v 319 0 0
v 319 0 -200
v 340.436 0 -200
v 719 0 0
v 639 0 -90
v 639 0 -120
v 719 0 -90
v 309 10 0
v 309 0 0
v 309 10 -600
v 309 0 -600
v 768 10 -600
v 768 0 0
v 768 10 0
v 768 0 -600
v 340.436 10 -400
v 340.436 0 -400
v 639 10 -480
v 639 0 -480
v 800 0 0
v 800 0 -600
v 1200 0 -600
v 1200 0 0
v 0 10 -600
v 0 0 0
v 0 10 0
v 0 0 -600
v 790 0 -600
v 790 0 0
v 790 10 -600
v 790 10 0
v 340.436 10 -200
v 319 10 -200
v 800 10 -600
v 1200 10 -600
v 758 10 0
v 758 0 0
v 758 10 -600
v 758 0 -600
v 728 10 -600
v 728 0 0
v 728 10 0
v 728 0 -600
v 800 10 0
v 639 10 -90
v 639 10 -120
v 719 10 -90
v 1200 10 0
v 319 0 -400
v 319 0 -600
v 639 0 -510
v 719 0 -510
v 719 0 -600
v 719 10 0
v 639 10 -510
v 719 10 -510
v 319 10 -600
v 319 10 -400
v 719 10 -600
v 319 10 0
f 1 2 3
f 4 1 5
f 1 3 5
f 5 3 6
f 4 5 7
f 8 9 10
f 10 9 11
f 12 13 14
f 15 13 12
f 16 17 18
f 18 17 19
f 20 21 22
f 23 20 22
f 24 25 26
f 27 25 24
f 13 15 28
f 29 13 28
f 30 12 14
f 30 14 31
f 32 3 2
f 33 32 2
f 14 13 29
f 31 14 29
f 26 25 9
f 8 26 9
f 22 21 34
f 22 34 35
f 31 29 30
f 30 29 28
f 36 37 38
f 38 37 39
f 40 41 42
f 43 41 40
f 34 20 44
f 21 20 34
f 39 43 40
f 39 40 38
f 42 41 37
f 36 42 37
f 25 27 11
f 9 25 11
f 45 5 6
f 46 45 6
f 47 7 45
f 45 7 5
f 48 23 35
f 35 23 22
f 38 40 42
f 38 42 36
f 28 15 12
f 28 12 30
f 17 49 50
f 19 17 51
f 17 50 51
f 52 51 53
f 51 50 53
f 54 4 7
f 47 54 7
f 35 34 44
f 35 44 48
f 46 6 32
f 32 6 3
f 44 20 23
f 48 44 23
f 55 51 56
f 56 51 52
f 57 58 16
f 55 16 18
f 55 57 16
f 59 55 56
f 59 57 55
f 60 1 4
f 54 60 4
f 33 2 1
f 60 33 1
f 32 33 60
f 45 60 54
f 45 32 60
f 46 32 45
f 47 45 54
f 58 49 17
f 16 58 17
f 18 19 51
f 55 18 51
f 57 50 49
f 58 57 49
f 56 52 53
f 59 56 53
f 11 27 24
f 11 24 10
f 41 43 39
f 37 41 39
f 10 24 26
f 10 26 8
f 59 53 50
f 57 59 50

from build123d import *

# Parameters (mm, degrees)
SKETCH1_W             = 309
SKETCH1_H             = 600
BOSS_EXTRUDE1_DEPTH   = 10
BOSS_EXTRUDE1_2_DEPTH = 10
SKETCH1_W_2           = 400
BOSS_EXTRUDE1_3_DEPTH = 10
BOSS_EXTRUDE1_4_DEPTH = 10
SKETCH1_W_3           = 22
BOSS_EXTRUDE1_5_DEPTH = 10
SKETCH1_W_4           = 30
BOSS_EXTRUDE1_6_DEPTH = 10


with BuildPart() as part:
    # Sketch1 → Boss-Extrude1 (new body)
    with BuildSketch(Plane(origin=(0, 0, 0), x_dir=(1, 0, 0), z_dir=(0, 1, 0))):
        with Locations((154.5, 300)):
            Rectangle(SKETCH1_W, SKETCH1_H)
    extrude(amount=BOSS_EXTRUDE1_DEPTH)


with BuildPart() as body_2:
    # Sketch1 → Boss-Extrude1 2 (new body)
    with BuildSketch(Plane(origin=(0, 0, 0), x_dir=(1, 0, 0), z_dir=(0, 1, 0))):
        Polygon((719, 510), (719, 600), (319, 600), (319, 400), (340.435935394, 400), (639, 480), (639, 510), align=None)
    extrude(amount=BOSS_EXTRUDE1_2_DEPTH)


with BuildPart() as body_3:
    # Sketch1 → Boss-Extrude1 3 (new body)
    with BuildSketch(Plane(origin=(0, 0, 0), x_dir=(1, 0, 0), z_dir=(0, 1, 0))):
        with Locations((1000, 300)):
            Rectangle(SKETCH1_W_2, SKETCH1_H)
    extrude(amount=BOSS_EXTRUDE1_3_DEPTH)


with BuildPart() as body_4:
    # Sketch1 → Boss-Extrude1 4 (new body)
    with BuildSketch(Plane(origin=(0, 0, 0), x_dir=(1, 0, 0), z_dir=(0, 1, 0))):
        Polygon((719, 0), (719, 90), (639, 90), (639, 120), (340.435935394, 200), (319, 200), (319, 0), align=None)
    extrude(amount=BOSS_EXTRUDE1_4_DEPTH)


with BuildPart() as body_5:
    # Sketch1 → Boss-Extrude1 5 (new body)
    with BuildSketch(Plane(origin=(0, 0, 0), x_dir=(1, 0, 0), z_dir=(0, 1, 0))):
        with Locations((779, 300)):
            Rectangle(SKETCH1_W_3, SKETCH1_H)
    extrude(amount=BOSS_EXTRUDE1_5_DEPTH)


with BuildPart() as body_6:
    # Sketch1 → Boss-Extrude1 6 (new body)
    with BuildSketch(Plane(origin=(0, 0, 0), x_dir=(1, 0, 0), z_dir=(0, 1, 0))):
        with Locations((743, 300)):
            Rectangle(SKETCH1_W_4, SKETCH1_H)
    extrude(amount=BOSS_EXTRUDE1_6_DEPTH)


solid = Compound([part.part, body_2.part, body_3.part, body_4.part, body_5.part, body_6.part])
